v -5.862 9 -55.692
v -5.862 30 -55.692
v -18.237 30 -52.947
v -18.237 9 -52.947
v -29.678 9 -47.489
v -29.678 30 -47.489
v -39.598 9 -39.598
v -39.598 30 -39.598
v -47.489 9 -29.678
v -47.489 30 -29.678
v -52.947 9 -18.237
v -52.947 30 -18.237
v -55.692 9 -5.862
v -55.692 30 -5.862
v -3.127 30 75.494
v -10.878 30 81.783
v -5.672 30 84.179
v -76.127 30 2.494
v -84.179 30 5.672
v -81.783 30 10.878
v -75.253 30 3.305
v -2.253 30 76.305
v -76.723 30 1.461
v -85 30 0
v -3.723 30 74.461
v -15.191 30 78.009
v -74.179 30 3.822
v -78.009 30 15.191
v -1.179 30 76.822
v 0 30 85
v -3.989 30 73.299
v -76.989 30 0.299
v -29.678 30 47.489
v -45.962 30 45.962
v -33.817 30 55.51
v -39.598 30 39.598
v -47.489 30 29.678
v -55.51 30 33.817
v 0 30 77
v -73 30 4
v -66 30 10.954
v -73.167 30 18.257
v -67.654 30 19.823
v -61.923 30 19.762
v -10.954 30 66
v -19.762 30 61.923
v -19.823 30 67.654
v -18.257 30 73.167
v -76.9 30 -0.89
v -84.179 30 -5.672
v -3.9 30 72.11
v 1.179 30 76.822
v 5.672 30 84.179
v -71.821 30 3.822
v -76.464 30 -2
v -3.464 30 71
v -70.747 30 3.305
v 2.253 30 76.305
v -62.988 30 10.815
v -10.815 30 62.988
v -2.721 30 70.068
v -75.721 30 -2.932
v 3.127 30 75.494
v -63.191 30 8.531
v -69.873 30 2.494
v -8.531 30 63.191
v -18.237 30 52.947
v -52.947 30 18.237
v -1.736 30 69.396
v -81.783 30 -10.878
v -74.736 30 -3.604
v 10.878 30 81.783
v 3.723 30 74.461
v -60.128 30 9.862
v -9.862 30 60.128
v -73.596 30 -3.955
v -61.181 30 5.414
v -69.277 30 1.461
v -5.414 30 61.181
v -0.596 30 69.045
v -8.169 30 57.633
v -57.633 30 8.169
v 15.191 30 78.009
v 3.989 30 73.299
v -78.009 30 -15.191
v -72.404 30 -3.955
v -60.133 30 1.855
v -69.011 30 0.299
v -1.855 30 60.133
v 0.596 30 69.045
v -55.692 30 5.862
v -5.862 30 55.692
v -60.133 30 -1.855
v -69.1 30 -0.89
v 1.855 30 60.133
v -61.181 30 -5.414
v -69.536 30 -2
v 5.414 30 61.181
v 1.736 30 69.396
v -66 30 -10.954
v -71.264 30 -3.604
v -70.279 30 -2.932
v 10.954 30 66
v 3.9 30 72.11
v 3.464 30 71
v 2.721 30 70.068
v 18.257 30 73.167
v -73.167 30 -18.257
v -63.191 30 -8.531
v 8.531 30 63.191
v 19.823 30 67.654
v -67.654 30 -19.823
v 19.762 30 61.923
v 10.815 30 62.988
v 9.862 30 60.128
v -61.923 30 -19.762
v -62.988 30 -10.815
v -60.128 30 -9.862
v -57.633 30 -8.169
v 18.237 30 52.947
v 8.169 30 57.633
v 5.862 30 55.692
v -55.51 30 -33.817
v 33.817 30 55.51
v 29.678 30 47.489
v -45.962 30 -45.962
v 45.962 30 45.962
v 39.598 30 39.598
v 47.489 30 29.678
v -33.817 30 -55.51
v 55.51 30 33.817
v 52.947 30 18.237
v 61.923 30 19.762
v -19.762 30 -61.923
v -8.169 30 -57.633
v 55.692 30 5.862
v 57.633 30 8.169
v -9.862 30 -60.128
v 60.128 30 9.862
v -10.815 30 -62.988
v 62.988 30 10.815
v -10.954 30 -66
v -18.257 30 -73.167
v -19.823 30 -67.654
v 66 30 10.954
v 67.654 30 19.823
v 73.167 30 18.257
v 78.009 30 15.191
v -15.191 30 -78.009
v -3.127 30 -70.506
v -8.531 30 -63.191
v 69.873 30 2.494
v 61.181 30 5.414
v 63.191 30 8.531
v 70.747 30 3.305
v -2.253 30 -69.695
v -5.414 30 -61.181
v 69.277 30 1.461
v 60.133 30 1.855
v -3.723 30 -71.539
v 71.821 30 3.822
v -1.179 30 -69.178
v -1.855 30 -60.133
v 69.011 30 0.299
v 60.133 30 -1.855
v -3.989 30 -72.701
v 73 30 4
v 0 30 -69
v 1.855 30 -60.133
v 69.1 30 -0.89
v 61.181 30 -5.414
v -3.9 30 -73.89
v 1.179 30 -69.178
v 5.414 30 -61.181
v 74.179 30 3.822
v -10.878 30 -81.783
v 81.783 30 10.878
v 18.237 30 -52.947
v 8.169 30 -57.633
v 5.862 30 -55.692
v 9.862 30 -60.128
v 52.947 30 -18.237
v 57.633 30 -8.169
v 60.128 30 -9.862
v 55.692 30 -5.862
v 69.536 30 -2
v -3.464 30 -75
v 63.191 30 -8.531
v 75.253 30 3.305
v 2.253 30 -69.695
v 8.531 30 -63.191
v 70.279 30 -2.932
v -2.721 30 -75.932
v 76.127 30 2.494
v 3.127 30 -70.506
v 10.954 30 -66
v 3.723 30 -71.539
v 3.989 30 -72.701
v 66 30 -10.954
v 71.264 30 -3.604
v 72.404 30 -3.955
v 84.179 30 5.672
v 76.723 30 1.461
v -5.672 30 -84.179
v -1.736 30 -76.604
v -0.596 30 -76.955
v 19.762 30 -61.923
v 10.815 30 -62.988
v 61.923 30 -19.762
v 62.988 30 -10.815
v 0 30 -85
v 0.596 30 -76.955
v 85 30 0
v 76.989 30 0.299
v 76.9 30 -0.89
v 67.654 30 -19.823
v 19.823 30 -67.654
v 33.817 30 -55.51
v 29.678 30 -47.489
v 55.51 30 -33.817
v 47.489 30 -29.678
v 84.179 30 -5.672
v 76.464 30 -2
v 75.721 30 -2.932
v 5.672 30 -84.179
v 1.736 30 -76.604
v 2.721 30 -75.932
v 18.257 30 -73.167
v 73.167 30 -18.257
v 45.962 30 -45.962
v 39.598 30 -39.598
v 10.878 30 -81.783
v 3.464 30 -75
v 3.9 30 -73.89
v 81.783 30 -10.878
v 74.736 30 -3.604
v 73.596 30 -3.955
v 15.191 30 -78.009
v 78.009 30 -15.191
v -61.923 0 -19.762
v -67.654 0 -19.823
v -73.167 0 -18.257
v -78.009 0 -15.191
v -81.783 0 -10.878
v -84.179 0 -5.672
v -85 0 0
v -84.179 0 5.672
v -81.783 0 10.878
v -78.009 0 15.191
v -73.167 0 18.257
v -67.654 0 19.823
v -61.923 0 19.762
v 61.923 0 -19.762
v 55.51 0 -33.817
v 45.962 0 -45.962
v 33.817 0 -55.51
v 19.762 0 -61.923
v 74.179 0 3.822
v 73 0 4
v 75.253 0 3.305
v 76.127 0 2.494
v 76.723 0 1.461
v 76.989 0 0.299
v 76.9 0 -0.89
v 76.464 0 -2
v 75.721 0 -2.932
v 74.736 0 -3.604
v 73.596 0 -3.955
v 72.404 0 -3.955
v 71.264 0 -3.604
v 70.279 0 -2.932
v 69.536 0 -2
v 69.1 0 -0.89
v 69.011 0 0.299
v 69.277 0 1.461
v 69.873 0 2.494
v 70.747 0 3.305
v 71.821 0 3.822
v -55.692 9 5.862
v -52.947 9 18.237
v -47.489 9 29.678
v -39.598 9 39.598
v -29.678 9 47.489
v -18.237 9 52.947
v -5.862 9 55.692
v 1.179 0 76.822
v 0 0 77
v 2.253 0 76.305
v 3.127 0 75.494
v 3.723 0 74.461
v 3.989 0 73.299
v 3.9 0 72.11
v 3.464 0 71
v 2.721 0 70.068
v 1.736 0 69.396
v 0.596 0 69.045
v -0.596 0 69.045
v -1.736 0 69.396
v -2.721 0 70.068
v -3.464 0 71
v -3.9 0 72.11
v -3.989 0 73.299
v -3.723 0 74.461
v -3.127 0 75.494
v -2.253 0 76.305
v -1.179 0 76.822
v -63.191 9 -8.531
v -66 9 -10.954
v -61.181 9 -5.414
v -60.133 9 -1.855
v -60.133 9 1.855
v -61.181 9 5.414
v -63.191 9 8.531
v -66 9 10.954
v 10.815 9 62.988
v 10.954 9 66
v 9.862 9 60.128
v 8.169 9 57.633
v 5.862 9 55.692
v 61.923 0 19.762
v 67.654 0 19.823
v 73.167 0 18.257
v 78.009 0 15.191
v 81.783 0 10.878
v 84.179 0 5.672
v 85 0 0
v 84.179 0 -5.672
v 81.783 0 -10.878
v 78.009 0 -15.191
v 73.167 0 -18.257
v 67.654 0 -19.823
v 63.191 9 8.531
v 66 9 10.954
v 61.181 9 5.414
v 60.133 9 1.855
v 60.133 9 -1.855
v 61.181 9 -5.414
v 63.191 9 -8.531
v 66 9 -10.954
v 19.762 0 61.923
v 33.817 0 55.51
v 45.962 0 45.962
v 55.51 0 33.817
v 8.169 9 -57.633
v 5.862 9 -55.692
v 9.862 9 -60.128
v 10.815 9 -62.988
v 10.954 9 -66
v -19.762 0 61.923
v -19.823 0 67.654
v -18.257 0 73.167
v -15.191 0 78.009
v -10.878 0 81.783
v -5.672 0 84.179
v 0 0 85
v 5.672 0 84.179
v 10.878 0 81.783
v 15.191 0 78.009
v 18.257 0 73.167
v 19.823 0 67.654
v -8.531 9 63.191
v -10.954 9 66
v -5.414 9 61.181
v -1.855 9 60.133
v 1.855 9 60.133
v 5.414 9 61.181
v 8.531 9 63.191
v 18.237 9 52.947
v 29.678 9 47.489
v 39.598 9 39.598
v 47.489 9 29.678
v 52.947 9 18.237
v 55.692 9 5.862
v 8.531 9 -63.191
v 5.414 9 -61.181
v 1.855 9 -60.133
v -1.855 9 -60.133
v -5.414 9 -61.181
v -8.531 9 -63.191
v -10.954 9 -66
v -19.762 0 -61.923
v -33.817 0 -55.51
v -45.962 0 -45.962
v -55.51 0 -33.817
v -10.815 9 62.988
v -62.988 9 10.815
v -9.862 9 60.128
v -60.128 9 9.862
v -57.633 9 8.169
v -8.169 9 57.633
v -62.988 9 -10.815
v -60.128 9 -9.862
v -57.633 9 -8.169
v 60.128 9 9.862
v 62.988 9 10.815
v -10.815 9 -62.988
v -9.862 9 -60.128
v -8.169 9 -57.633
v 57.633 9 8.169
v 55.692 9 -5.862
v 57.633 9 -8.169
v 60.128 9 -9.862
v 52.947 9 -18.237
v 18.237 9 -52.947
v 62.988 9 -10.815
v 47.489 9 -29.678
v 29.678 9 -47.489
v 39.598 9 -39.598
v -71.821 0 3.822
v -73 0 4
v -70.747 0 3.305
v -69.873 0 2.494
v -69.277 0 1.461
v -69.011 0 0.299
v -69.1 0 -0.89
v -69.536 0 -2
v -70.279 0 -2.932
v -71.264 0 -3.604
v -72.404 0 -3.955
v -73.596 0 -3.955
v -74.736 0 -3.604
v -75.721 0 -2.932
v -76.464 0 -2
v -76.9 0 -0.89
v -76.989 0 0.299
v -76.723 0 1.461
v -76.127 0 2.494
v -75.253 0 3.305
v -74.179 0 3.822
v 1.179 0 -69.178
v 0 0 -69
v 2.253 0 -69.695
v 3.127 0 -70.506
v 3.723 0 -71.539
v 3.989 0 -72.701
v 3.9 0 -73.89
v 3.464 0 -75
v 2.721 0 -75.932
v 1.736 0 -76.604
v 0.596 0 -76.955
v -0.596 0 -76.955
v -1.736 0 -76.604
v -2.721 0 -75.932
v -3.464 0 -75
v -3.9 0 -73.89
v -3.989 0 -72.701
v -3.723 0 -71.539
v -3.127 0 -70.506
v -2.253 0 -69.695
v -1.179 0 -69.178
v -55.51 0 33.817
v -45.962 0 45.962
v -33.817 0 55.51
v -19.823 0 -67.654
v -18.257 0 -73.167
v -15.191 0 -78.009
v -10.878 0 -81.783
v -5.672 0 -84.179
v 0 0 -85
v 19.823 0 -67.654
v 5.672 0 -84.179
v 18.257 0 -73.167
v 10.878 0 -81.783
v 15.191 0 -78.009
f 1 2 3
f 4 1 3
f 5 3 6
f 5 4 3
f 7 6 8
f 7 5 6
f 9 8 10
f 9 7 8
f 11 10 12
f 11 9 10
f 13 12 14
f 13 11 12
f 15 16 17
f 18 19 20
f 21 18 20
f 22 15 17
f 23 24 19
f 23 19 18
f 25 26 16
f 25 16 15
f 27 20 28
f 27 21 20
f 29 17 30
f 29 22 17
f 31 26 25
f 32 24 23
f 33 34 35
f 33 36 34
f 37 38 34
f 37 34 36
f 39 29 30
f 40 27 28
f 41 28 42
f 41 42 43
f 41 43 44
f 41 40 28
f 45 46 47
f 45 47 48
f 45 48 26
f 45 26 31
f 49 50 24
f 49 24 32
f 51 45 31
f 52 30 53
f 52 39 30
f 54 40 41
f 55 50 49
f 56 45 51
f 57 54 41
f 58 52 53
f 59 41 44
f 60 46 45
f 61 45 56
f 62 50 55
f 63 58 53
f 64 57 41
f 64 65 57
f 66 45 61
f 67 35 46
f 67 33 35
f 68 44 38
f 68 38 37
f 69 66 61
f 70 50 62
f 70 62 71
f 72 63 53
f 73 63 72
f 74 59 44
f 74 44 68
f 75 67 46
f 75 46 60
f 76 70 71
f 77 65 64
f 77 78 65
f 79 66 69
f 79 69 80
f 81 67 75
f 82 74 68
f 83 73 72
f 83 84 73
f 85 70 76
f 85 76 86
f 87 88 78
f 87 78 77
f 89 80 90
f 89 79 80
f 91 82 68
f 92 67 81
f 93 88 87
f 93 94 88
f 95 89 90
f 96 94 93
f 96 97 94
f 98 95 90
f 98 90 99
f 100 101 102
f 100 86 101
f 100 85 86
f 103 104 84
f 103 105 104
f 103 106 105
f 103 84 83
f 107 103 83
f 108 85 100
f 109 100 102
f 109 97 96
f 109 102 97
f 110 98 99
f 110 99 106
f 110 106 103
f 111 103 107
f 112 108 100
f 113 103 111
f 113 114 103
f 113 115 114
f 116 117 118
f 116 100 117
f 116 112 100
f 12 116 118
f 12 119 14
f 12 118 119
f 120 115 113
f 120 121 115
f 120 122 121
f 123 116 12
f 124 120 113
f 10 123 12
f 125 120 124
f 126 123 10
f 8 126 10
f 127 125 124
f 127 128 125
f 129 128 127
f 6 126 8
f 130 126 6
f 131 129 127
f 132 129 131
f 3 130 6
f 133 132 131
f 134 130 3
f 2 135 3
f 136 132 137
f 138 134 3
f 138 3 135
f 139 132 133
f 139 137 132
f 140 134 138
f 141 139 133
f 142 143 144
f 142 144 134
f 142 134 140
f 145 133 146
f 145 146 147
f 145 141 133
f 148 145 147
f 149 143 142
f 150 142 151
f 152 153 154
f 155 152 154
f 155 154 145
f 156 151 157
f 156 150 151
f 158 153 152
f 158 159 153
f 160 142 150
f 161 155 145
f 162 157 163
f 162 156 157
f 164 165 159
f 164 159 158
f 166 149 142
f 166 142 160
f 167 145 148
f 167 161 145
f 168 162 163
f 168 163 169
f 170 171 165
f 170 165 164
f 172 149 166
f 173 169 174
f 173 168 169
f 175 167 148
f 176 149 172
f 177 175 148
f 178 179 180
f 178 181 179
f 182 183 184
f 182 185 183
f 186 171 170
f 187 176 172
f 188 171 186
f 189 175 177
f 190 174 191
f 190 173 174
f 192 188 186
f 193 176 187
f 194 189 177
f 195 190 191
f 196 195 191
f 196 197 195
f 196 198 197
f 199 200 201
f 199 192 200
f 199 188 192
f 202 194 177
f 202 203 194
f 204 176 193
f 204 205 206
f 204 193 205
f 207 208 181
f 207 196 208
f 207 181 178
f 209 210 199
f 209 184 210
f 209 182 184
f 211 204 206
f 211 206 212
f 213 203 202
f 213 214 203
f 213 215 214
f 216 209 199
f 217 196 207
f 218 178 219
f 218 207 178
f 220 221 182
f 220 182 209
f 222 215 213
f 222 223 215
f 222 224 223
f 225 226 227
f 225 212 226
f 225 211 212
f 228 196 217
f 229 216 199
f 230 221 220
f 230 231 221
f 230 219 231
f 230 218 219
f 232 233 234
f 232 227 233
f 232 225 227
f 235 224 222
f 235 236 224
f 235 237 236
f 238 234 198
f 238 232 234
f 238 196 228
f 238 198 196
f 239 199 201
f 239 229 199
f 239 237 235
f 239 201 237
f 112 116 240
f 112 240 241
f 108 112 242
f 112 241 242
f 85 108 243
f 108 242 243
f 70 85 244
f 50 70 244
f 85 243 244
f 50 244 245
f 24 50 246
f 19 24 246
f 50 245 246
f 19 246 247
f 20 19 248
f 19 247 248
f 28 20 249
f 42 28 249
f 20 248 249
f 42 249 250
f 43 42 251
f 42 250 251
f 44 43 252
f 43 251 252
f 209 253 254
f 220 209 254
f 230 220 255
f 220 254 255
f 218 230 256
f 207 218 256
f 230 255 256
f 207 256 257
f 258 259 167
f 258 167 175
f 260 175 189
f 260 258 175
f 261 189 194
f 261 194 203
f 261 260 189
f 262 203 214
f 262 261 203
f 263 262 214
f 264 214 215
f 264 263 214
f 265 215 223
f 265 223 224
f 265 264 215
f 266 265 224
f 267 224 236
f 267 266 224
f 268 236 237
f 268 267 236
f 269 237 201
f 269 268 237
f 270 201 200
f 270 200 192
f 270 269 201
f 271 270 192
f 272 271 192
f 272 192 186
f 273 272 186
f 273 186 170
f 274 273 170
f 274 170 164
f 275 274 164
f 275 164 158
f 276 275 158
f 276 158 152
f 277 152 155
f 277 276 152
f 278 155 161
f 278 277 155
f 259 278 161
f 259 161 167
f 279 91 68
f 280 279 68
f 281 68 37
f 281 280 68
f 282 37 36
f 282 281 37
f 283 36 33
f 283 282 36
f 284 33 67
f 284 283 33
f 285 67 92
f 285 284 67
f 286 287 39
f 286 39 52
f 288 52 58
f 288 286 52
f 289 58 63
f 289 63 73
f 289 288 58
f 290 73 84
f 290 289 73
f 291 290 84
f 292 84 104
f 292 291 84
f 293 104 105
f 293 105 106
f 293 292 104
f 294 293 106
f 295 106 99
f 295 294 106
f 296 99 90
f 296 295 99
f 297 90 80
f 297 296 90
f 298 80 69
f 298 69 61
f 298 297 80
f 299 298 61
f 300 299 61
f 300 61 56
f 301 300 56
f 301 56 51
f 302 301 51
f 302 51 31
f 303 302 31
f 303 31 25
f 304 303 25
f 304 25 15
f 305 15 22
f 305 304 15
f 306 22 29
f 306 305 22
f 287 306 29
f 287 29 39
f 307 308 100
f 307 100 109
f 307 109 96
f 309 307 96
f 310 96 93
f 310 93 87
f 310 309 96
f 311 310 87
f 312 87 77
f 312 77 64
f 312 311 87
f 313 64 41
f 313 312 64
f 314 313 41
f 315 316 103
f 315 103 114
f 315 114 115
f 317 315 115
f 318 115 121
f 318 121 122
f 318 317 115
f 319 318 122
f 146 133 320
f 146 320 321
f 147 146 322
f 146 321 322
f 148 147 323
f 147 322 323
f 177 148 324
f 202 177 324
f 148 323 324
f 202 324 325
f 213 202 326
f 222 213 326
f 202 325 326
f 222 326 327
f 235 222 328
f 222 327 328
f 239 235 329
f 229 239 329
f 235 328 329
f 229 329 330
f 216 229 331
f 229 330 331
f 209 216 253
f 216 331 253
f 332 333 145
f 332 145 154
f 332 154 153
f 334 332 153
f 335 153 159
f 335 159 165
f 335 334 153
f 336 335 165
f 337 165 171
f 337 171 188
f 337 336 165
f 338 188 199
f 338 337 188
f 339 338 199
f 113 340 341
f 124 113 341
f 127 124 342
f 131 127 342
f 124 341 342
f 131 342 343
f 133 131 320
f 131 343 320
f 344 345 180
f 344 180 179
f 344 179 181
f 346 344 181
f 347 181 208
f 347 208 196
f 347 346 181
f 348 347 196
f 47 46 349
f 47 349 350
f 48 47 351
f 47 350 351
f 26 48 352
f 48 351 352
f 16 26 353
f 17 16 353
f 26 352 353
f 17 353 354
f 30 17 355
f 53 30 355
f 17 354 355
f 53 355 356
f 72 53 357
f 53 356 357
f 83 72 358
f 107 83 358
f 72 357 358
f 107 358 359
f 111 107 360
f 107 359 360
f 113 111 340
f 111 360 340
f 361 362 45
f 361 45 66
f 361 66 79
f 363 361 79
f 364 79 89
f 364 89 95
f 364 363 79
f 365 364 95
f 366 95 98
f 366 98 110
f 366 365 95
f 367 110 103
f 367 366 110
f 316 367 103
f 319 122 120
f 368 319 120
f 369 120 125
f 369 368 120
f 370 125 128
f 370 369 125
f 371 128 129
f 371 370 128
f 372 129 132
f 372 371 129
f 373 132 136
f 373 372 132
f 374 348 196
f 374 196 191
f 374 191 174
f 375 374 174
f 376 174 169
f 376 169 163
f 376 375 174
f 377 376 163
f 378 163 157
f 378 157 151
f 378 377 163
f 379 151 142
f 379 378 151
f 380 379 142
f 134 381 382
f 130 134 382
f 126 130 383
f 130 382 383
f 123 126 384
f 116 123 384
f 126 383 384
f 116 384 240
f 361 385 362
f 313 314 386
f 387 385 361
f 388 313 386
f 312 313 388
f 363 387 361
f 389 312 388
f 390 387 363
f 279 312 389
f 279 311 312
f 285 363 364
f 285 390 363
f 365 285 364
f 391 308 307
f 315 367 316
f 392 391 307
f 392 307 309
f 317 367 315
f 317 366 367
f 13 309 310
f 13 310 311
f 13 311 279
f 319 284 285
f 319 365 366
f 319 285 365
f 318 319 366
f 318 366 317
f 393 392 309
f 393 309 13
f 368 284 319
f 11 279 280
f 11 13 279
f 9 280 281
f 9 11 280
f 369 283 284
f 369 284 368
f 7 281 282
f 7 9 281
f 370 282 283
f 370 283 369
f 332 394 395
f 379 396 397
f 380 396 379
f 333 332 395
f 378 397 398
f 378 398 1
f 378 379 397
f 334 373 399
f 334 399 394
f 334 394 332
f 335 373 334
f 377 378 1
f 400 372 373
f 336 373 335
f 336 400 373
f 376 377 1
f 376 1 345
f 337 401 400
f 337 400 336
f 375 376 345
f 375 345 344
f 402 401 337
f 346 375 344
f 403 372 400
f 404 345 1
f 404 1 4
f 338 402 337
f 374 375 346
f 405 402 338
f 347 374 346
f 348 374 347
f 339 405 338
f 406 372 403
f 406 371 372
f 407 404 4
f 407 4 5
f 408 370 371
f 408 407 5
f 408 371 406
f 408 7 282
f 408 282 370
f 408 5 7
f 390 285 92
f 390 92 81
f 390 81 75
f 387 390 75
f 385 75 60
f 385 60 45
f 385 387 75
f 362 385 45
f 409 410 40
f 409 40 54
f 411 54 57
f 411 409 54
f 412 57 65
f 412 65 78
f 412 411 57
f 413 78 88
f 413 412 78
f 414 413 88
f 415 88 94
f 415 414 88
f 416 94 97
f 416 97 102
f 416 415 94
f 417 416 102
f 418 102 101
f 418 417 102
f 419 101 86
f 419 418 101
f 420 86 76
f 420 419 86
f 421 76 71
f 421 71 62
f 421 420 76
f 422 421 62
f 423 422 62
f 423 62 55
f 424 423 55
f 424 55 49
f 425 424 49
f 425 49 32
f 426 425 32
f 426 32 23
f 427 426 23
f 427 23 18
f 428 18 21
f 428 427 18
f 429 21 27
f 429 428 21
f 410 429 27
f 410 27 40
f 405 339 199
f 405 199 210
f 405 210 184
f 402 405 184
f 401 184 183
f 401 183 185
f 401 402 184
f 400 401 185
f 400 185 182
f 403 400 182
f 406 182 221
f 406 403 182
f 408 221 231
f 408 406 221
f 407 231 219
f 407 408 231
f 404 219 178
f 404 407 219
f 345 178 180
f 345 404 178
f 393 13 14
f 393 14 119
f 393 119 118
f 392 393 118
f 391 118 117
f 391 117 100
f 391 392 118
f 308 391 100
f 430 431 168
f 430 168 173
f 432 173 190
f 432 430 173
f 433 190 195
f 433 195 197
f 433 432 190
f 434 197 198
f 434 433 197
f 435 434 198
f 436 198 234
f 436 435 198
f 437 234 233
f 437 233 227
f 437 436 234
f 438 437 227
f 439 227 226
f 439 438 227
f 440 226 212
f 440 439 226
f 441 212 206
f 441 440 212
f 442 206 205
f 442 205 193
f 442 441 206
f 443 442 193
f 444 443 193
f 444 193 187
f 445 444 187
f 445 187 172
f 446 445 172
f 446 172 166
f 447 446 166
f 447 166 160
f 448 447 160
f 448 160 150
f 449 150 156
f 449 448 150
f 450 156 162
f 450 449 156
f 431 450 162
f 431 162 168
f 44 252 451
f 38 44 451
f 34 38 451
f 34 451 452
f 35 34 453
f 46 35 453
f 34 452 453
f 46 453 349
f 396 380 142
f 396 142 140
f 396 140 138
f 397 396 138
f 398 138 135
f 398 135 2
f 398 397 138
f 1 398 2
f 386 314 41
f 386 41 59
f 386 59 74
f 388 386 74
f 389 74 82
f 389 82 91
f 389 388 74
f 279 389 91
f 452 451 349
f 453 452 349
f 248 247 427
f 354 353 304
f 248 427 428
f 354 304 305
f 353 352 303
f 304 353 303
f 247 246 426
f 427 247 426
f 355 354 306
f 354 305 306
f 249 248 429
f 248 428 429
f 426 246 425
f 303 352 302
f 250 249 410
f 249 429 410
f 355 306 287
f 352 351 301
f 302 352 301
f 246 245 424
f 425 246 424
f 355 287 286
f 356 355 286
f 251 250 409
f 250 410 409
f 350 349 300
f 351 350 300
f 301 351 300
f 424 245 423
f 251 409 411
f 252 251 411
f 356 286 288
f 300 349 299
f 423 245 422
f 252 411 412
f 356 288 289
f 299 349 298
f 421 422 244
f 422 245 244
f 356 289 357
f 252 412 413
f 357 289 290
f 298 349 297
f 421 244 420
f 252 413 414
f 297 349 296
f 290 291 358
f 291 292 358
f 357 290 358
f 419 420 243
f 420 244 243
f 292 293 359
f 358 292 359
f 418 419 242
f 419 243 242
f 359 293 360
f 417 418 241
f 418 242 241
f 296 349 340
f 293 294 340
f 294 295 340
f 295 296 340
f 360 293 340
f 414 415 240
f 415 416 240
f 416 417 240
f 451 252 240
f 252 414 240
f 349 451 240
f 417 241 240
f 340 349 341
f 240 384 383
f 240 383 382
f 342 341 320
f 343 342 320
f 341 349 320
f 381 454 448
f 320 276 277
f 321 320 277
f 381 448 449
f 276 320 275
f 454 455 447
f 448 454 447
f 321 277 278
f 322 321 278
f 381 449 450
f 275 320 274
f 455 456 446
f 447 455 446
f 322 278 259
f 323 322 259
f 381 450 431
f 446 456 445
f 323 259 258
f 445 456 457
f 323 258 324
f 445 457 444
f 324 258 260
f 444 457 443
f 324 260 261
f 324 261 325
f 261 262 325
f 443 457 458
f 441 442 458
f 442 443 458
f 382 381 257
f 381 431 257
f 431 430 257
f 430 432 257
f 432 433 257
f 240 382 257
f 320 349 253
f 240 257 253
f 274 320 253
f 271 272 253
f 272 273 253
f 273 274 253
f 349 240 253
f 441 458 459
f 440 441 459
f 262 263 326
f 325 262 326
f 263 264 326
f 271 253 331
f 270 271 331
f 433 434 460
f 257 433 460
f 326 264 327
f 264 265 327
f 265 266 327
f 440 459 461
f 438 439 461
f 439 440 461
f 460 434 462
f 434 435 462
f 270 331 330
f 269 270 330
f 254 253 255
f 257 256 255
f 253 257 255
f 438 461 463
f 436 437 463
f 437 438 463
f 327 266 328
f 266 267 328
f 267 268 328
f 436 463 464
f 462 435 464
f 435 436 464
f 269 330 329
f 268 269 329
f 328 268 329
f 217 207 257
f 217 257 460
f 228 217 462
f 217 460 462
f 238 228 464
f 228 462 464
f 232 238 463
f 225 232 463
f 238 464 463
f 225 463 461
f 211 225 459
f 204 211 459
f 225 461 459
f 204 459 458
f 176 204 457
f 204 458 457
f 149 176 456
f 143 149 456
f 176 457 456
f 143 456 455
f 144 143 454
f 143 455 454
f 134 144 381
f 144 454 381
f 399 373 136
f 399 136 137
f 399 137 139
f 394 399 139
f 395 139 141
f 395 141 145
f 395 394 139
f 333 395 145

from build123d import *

# Parameters (mm, degrees)
SKETCH1_R           = 4
SKETCH1_R_2         = 65
BOSS_EXTRUDE1_DEPTH = 30
SHELL1_START        = 9
SHELL1_DEPTH        = 21


# Read off the part's stored shape, not the designer's step: Shell1
with BuildPart() as part:
    # Sketch1 → Boss-Extrude1 (new body)
    # profile 1 of 5: a face of its own
    with BuildSketch(Plane(origin=(0, 0, 0), x_dir=(1, 0, 0), z_dir=(0, 1, 0))):
        with BuildLine():
            ThreePointArc((-61.923076923, 19.761896275), (-85, 0), (-61.923076923, -19.761896275))
            ThreePointArc((-61.923076923, -19.761896275), (-65, 0), (-61.923076923, 19.761896275))
        make_face()
        with Locations(Location((-73, 0, 0), (0, 0, 270))):
            Circle(SKETCH1_R, mode=Mode.SUBTRACT)
    # profile 2 of 5: a face of its own
    with BuildSketch(Plane(origin=(0, 0, 0), x_dir=(1, 0, 0), z_dir=(0, 1, 0))):
        with BuildLine():
            ThreePointArc((-19.761896275, -61.923076923), (0, -85), (19.761896275, -61.923076923))
            ThreePointArc((19.761896275, -61.923076923), (0, -65), (-19.761896275, -61.923076923))
        make_face()
        with Locations(Location((0, -73, 0), (0, 0, 270))):
            Circle(SKETCH1_R, mode=Mode.SUBTRACT)
    # profile 3 of 5: a face of its own
    with BuildSketch(Plane(origin=(0, 0, 0), x_dir=(1, 0, 0), z_dir=(0, 1, 0))):
        Circle(SKETCH1_R_2)
    # profile 4 of 5: a face of its own
    with BuildSketch(Plane(origin=(0, 0, 0), x_dir=(1, 0, 0), z_dir=(0, 1, 0))):
        with BuildLine():
            ThreePointArc((65, 0), (64.226162893, -10), (61.923076923, -19.761896275))
            ThreePointArc((61.923076923, -19.761896275), (85, 0), (61.923076923, 19.761896275))
            ThreePointArc((61.923076923, 19.761896275), (64.226162893, 10), (65, 0))
        make_face()
        with Locations(Location((73, 0, 0), (0, 0, 270))):
            Circle(SKETCH1_R, mode=Mode.SUBTRACT)
    # profile 5 of 5: a face of its own
    with BuildSketch(Plane(origin=(0, 0, 0), x_dir=(1, 0, 0), z_dir=(0, 1, 0))):
        with BuildLine():
            ThreePointArc((-19.761896275, 61.923076923), (0, 65), (19.761896275, 61.923076923))
            ThreePointArc((19.761896275, 61.923076923), (0, 85), (-19.761896275, 61.923076923))
        make_face()
        with Locations(Location((0, 73, 0), (0, 0, 270))):
            Circle(SKETCH1_R, mode=Mode.SUBTRACT)
    extrude(amount=BOSS_EXTRUDE1_DEPTH)

    # Shell1 outline → Shell1 (cut)
    with BuildSketch(Plane(origin=(0, 0, 0), x_dir=(1, 0, 0), z_dir=(0, 1, 0)).offset(SHELL1_START)):
        with BuildLine():
            ThreePointArc((-66, -10.95445115), (-60.127949817, -9.862207005), (-55.692307692, -5.86232581))
            ThreePointArc((-55.692307692, -5.86232581), (-39.597979746, -39.597979746), (-5.86232581, -55.692307692))
            ThreePointArc((-5.86232581, -55.692307692), (-9.862207005, -60.127949817), (-10.95445115, -66))
            ThreePointArc((-10.95445115, -66), (0, -60), (10.95445115, -66))
            ThreePointArc((10.95445115, -66), (9.862207005, -60.127949817), (5.86232581, -55.692307692))
            ThreePointArc((5.86232581, -55.692307692), (39.597979746, -39.597979746), (55.692307692, -5.86232581))
            ThreePointArc((55.692307692, -5.86232581), (60.127949817, -9.862207005), (66, -10.95445115))
            ThreePointArc((66, -10.95445115), (60, 0), (66, 10.95445115))
            ThreePointArc((66, 10.95445115), (60.127949817, 9.862207005), (55.692307692, 5.86232581))
            ThreePointArc((55.692307692, 5.86232581), (39.597979746, 39.597979746), (5.86232581, 55.692307692))
            ThreePointArc((5.86232581, 55.692307692), (9.862207005, 60.127949817), (10.95445115, 66))
            ThreePointArc((10.95445115, 66), (0, 60), (-10.95445115, 66))
            ThreePointArc((-10.95445115, 66), (-9.862207005, 60.127949817), (-5.86232581, 55.692307692))
            ThreePointArc((-5.86232581, 55.692307692), (-39.597979746, 39.597979746), (-55.692307692, 5.86232581))
            ThreePointArc((-55.692307692, 5.86232581), (-60.127949817, 9.862207005), (-66, 10.95445115))
            ThreePointArc((-66, 10.95445115), (-60, 0), (-66, -10.95445115))
        make_face()
    extrude(amount=SHELL1_DEPTH, mode=Mode.SUBTRACT)


solid = part.part
